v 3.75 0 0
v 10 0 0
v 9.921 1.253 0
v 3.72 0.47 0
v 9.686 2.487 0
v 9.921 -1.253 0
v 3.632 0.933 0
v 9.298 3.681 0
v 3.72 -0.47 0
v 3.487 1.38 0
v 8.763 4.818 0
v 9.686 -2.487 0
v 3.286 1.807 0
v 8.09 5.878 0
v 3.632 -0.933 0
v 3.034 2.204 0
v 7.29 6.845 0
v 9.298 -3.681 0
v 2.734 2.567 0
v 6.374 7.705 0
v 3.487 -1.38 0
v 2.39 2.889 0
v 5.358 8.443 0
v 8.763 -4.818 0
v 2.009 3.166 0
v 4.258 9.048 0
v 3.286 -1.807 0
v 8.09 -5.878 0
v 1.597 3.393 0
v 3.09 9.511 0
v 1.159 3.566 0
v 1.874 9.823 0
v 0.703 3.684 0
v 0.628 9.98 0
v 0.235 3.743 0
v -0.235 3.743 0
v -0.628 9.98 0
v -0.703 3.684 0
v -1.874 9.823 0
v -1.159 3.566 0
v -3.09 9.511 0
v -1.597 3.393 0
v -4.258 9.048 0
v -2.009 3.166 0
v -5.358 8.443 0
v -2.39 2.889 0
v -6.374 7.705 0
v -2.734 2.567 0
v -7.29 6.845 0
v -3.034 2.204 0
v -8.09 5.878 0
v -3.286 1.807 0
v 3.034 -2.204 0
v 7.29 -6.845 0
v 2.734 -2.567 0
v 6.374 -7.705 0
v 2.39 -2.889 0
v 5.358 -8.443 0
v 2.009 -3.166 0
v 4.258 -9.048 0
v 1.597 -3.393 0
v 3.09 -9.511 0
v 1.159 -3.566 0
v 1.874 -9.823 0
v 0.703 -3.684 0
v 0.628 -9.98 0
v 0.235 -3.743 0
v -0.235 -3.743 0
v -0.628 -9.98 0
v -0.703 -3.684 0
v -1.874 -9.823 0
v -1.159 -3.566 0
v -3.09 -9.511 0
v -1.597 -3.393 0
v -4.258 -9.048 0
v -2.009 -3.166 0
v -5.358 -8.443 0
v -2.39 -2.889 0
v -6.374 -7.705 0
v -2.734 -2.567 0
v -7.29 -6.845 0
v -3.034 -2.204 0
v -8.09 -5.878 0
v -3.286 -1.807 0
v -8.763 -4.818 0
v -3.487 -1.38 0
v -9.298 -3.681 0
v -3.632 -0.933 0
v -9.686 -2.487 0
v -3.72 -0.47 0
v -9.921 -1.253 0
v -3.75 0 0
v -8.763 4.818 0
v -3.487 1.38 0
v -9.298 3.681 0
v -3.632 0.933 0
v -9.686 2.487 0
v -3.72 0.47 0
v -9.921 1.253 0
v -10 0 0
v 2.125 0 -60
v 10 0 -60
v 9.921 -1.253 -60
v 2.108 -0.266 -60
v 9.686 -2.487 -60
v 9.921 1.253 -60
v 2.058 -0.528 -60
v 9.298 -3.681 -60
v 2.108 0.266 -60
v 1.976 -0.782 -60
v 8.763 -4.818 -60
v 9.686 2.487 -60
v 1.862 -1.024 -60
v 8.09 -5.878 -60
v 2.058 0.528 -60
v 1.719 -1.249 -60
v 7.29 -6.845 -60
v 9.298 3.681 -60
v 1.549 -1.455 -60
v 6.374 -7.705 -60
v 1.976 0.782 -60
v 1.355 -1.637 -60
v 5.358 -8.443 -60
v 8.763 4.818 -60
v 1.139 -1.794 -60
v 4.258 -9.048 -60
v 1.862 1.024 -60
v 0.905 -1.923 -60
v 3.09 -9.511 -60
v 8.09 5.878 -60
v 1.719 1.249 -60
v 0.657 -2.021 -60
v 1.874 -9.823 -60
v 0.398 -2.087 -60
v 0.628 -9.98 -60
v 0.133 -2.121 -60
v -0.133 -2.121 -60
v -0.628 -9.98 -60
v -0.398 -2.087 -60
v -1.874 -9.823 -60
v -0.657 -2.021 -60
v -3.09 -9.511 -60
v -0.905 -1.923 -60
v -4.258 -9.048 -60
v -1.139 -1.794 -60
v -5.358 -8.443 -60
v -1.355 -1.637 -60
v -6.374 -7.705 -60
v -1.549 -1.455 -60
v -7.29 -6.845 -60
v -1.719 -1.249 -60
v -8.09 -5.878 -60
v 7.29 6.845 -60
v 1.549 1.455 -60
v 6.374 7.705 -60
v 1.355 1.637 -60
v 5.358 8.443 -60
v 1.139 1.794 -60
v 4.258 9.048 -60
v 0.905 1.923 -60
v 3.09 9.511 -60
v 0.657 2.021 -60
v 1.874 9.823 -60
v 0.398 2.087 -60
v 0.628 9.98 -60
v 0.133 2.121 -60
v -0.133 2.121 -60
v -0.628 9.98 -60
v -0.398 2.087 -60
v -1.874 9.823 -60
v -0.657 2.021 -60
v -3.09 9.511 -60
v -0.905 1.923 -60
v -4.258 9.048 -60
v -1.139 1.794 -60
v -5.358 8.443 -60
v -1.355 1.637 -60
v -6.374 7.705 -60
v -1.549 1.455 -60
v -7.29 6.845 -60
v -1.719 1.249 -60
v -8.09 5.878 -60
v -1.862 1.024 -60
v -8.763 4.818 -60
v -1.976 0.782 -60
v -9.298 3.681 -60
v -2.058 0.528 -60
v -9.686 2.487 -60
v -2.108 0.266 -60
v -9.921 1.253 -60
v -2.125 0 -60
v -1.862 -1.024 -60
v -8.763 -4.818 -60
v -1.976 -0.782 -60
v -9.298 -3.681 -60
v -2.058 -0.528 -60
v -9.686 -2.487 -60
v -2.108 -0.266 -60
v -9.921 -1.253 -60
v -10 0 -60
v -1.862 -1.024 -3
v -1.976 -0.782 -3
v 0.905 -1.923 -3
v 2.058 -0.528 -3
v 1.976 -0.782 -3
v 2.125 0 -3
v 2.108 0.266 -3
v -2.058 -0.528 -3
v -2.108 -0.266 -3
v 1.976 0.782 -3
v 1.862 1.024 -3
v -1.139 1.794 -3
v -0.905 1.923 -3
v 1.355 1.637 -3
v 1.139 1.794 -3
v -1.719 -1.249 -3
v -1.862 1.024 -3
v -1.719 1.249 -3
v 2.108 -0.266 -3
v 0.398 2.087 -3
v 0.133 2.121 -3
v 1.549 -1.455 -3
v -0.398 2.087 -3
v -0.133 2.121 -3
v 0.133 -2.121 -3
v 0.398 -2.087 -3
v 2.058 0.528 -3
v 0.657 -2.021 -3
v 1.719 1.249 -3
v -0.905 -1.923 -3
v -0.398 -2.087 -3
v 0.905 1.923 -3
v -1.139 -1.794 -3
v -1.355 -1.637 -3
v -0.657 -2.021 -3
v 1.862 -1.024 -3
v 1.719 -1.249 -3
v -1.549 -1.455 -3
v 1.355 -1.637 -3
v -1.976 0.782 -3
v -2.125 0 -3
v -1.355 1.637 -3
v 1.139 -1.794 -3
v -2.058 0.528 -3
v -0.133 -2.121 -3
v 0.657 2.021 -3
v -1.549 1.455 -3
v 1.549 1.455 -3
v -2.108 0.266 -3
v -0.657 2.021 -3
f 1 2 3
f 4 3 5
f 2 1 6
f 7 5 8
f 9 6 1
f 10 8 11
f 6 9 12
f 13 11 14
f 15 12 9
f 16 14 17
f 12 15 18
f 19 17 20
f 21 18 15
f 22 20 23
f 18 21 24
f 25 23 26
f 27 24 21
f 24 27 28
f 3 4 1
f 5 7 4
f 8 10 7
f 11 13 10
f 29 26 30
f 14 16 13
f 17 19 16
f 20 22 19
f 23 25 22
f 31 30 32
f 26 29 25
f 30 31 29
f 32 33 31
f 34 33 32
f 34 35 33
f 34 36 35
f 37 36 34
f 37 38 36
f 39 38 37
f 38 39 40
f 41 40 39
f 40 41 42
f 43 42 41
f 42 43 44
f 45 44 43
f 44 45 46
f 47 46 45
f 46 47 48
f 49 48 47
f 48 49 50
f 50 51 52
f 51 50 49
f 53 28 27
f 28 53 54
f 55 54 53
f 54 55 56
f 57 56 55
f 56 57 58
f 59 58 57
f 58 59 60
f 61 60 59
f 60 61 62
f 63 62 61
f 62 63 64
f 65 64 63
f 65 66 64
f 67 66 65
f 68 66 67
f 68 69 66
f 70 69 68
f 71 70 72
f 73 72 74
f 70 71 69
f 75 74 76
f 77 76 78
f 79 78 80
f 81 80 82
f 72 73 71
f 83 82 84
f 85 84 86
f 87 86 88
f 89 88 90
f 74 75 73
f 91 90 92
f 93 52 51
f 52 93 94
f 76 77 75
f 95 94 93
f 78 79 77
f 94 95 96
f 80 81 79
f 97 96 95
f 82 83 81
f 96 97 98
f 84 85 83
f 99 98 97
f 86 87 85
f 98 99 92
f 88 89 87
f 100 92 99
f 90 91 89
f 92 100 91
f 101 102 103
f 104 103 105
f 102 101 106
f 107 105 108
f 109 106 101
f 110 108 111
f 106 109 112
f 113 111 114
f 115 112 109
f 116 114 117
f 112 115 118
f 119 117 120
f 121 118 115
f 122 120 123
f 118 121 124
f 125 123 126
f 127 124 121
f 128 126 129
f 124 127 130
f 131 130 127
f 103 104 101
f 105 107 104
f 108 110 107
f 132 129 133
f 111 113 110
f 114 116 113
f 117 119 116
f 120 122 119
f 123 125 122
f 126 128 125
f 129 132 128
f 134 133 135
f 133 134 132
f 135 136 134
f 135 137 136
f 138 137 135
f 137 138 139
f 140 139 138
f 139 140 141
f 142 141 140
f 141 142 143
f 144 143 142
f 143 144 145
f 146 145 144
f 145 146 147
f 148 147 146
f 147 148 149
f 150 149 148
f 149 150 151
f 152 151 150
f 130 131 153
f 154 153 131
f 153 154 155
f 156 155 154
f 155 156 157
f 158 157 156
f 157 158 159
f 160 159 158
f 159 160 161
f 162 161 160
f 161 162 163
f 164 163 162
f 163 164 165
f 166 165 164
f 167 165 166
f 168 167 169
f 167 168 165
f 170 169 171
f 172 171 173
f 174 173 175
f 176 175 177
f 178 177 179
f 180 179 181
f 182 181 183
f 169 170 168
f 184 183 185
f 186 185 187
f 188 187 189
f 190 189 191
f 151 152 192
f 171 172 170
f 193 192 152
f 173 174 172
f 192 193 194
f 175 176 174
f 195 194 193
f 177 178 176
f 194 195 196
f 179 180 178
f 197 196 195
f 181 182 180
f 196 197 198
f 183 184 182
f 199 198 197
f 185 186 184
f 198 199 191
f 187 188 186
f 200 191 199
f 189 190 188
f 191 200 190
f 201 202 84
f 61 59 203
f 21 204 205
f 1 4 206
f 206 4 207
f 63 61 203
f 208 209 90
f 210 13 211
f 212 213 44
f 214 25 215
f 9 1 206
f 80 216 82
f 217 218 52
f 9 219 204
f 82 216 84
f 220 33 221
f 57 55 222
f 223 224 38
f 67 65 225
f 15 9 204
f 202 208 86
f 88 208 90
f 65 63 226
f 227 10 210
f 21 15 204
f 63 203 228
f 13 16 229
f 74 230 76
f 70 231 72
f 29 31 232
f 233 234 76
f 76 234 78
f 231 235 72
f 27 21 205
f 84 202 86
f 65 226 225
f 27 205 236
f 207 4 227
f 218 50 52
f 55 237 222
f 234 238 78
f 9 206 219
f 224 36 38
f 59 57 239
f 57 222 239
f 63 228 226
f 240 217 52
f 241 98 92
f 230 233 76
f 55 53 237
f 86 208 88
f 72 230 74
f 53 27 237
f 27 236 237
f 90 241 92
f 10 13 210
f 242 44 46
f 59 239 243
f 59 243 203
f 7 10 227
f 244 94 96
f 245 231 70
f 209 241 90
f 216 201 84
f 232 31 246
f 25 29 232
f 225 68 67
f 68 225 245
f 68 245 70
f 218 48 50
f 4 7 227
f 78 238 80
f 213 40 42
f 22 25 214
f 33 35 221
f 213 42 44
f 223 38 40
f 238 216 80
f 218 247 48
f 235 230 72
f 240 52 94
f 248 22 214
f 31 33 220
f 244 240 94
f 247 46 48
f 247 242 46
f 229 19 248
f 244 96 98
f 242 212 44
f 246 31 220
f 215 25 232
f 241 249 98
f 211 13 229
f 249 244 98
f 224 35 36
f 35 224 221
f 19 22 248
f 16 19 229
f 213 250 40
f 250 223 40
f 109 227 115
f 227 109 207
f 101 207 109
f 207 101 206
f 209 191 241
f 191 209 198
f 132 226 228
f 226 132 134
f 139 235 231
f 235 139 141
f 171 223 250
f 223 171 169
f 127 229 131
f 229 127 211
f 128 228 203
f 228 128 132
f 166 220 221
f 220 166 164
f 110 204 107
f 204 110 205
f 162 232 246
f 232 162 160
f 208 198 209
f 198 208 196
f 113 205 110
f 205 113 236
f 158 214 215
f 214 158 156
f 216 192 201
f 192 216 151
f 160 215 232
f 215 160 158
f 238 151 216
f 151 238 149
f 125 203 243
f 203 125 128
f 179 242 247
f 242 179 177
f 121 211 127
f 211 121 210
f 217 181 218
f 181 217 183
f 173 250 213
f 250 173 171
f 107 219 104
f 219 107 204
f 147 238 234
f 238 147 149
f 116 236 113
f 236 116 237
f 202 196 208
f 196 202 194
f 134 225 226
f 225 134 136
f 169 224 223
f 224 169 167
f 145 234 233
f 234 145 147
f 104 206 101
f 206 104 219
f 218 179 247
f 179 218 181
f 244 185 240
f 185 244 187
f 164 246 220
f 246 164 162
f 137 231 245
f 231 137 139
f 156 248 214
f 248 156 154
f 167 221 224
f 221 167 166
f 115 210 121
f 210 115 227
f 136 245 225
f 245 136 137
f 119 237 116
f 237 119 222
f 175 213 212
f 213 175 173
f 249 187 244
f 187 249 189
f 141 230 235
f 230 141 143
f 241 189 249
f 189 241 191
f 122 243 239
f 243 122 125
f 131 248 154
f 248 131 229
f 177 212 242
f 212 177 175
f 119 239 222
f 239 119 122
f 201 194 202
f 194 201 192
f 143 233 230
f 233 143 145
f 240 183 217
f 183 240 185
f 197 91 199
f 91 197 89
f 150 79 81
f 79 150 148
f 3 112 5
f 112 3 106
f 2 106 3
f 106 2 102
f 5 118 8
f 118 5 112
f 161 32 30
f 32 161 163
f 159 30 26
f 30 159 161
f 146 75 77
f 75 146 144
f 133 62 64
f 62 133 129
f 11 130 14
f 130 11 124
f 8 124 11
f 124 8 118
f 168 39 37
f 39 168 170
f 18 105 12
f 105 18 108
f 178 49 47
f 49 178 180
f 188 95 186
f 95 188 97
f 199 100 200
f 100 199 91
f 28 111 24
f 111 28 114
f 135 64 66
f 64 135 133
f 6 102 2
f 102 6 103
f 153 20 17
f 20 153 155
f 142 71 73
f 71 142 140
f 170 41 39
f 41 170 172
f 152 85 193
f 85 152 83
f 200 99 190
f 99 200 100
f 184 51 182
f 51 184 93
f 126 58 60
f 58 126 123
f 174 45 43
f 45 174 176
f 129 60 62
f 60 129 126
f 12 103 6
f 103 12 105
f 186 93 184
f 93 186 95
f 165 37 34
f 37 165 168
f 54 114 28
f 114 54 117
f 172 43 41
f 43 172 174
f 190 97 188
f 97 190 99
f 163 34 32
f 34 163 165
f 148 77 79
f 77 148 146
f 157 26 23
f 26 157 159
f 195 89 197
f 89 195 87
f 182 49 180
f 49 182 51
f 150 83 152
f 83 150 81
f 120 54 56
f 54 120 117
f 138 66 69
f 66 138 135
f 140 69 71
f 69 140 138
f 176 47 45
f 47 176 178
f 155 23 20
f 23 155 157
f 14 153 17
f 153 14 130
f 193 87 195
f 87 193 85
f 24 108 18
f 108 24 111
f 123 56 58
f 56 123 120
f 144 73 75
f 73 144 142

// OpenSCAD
$fn = 50;


difference() {
	union() {
		translate(v = [0, 0, -60.0000000000]) {
			cylinder(h = 60, r = 10.0000000000);
		}
	}
	union() {
		translate(v = [0, 0, 0]) {
			rotate(a = [0, 0, 0]) {
				difference() {
					union() {
						#translate(v = [0, 0, -60.0000000000]) {
							cylinder(h = 60, r = 2.0000000000);
						}
						#translate(v = [0, 0, -3]) {
							cylinder(h = 3, r = 10.0000000000, r1 = 2.1250000000, r2 = 3.7500000000);
						}
						#translate(v = [0, 0, -60.0000000000]) {
							cylinder(h = 60, r = 2.1250000000);
						}
						#translate(v = [0, 0, -60.0000000000]) {
							cylinder(h = 60, r = 2.0000000000);
						}
					}
					union();
				}
			}
		}
	}
}
